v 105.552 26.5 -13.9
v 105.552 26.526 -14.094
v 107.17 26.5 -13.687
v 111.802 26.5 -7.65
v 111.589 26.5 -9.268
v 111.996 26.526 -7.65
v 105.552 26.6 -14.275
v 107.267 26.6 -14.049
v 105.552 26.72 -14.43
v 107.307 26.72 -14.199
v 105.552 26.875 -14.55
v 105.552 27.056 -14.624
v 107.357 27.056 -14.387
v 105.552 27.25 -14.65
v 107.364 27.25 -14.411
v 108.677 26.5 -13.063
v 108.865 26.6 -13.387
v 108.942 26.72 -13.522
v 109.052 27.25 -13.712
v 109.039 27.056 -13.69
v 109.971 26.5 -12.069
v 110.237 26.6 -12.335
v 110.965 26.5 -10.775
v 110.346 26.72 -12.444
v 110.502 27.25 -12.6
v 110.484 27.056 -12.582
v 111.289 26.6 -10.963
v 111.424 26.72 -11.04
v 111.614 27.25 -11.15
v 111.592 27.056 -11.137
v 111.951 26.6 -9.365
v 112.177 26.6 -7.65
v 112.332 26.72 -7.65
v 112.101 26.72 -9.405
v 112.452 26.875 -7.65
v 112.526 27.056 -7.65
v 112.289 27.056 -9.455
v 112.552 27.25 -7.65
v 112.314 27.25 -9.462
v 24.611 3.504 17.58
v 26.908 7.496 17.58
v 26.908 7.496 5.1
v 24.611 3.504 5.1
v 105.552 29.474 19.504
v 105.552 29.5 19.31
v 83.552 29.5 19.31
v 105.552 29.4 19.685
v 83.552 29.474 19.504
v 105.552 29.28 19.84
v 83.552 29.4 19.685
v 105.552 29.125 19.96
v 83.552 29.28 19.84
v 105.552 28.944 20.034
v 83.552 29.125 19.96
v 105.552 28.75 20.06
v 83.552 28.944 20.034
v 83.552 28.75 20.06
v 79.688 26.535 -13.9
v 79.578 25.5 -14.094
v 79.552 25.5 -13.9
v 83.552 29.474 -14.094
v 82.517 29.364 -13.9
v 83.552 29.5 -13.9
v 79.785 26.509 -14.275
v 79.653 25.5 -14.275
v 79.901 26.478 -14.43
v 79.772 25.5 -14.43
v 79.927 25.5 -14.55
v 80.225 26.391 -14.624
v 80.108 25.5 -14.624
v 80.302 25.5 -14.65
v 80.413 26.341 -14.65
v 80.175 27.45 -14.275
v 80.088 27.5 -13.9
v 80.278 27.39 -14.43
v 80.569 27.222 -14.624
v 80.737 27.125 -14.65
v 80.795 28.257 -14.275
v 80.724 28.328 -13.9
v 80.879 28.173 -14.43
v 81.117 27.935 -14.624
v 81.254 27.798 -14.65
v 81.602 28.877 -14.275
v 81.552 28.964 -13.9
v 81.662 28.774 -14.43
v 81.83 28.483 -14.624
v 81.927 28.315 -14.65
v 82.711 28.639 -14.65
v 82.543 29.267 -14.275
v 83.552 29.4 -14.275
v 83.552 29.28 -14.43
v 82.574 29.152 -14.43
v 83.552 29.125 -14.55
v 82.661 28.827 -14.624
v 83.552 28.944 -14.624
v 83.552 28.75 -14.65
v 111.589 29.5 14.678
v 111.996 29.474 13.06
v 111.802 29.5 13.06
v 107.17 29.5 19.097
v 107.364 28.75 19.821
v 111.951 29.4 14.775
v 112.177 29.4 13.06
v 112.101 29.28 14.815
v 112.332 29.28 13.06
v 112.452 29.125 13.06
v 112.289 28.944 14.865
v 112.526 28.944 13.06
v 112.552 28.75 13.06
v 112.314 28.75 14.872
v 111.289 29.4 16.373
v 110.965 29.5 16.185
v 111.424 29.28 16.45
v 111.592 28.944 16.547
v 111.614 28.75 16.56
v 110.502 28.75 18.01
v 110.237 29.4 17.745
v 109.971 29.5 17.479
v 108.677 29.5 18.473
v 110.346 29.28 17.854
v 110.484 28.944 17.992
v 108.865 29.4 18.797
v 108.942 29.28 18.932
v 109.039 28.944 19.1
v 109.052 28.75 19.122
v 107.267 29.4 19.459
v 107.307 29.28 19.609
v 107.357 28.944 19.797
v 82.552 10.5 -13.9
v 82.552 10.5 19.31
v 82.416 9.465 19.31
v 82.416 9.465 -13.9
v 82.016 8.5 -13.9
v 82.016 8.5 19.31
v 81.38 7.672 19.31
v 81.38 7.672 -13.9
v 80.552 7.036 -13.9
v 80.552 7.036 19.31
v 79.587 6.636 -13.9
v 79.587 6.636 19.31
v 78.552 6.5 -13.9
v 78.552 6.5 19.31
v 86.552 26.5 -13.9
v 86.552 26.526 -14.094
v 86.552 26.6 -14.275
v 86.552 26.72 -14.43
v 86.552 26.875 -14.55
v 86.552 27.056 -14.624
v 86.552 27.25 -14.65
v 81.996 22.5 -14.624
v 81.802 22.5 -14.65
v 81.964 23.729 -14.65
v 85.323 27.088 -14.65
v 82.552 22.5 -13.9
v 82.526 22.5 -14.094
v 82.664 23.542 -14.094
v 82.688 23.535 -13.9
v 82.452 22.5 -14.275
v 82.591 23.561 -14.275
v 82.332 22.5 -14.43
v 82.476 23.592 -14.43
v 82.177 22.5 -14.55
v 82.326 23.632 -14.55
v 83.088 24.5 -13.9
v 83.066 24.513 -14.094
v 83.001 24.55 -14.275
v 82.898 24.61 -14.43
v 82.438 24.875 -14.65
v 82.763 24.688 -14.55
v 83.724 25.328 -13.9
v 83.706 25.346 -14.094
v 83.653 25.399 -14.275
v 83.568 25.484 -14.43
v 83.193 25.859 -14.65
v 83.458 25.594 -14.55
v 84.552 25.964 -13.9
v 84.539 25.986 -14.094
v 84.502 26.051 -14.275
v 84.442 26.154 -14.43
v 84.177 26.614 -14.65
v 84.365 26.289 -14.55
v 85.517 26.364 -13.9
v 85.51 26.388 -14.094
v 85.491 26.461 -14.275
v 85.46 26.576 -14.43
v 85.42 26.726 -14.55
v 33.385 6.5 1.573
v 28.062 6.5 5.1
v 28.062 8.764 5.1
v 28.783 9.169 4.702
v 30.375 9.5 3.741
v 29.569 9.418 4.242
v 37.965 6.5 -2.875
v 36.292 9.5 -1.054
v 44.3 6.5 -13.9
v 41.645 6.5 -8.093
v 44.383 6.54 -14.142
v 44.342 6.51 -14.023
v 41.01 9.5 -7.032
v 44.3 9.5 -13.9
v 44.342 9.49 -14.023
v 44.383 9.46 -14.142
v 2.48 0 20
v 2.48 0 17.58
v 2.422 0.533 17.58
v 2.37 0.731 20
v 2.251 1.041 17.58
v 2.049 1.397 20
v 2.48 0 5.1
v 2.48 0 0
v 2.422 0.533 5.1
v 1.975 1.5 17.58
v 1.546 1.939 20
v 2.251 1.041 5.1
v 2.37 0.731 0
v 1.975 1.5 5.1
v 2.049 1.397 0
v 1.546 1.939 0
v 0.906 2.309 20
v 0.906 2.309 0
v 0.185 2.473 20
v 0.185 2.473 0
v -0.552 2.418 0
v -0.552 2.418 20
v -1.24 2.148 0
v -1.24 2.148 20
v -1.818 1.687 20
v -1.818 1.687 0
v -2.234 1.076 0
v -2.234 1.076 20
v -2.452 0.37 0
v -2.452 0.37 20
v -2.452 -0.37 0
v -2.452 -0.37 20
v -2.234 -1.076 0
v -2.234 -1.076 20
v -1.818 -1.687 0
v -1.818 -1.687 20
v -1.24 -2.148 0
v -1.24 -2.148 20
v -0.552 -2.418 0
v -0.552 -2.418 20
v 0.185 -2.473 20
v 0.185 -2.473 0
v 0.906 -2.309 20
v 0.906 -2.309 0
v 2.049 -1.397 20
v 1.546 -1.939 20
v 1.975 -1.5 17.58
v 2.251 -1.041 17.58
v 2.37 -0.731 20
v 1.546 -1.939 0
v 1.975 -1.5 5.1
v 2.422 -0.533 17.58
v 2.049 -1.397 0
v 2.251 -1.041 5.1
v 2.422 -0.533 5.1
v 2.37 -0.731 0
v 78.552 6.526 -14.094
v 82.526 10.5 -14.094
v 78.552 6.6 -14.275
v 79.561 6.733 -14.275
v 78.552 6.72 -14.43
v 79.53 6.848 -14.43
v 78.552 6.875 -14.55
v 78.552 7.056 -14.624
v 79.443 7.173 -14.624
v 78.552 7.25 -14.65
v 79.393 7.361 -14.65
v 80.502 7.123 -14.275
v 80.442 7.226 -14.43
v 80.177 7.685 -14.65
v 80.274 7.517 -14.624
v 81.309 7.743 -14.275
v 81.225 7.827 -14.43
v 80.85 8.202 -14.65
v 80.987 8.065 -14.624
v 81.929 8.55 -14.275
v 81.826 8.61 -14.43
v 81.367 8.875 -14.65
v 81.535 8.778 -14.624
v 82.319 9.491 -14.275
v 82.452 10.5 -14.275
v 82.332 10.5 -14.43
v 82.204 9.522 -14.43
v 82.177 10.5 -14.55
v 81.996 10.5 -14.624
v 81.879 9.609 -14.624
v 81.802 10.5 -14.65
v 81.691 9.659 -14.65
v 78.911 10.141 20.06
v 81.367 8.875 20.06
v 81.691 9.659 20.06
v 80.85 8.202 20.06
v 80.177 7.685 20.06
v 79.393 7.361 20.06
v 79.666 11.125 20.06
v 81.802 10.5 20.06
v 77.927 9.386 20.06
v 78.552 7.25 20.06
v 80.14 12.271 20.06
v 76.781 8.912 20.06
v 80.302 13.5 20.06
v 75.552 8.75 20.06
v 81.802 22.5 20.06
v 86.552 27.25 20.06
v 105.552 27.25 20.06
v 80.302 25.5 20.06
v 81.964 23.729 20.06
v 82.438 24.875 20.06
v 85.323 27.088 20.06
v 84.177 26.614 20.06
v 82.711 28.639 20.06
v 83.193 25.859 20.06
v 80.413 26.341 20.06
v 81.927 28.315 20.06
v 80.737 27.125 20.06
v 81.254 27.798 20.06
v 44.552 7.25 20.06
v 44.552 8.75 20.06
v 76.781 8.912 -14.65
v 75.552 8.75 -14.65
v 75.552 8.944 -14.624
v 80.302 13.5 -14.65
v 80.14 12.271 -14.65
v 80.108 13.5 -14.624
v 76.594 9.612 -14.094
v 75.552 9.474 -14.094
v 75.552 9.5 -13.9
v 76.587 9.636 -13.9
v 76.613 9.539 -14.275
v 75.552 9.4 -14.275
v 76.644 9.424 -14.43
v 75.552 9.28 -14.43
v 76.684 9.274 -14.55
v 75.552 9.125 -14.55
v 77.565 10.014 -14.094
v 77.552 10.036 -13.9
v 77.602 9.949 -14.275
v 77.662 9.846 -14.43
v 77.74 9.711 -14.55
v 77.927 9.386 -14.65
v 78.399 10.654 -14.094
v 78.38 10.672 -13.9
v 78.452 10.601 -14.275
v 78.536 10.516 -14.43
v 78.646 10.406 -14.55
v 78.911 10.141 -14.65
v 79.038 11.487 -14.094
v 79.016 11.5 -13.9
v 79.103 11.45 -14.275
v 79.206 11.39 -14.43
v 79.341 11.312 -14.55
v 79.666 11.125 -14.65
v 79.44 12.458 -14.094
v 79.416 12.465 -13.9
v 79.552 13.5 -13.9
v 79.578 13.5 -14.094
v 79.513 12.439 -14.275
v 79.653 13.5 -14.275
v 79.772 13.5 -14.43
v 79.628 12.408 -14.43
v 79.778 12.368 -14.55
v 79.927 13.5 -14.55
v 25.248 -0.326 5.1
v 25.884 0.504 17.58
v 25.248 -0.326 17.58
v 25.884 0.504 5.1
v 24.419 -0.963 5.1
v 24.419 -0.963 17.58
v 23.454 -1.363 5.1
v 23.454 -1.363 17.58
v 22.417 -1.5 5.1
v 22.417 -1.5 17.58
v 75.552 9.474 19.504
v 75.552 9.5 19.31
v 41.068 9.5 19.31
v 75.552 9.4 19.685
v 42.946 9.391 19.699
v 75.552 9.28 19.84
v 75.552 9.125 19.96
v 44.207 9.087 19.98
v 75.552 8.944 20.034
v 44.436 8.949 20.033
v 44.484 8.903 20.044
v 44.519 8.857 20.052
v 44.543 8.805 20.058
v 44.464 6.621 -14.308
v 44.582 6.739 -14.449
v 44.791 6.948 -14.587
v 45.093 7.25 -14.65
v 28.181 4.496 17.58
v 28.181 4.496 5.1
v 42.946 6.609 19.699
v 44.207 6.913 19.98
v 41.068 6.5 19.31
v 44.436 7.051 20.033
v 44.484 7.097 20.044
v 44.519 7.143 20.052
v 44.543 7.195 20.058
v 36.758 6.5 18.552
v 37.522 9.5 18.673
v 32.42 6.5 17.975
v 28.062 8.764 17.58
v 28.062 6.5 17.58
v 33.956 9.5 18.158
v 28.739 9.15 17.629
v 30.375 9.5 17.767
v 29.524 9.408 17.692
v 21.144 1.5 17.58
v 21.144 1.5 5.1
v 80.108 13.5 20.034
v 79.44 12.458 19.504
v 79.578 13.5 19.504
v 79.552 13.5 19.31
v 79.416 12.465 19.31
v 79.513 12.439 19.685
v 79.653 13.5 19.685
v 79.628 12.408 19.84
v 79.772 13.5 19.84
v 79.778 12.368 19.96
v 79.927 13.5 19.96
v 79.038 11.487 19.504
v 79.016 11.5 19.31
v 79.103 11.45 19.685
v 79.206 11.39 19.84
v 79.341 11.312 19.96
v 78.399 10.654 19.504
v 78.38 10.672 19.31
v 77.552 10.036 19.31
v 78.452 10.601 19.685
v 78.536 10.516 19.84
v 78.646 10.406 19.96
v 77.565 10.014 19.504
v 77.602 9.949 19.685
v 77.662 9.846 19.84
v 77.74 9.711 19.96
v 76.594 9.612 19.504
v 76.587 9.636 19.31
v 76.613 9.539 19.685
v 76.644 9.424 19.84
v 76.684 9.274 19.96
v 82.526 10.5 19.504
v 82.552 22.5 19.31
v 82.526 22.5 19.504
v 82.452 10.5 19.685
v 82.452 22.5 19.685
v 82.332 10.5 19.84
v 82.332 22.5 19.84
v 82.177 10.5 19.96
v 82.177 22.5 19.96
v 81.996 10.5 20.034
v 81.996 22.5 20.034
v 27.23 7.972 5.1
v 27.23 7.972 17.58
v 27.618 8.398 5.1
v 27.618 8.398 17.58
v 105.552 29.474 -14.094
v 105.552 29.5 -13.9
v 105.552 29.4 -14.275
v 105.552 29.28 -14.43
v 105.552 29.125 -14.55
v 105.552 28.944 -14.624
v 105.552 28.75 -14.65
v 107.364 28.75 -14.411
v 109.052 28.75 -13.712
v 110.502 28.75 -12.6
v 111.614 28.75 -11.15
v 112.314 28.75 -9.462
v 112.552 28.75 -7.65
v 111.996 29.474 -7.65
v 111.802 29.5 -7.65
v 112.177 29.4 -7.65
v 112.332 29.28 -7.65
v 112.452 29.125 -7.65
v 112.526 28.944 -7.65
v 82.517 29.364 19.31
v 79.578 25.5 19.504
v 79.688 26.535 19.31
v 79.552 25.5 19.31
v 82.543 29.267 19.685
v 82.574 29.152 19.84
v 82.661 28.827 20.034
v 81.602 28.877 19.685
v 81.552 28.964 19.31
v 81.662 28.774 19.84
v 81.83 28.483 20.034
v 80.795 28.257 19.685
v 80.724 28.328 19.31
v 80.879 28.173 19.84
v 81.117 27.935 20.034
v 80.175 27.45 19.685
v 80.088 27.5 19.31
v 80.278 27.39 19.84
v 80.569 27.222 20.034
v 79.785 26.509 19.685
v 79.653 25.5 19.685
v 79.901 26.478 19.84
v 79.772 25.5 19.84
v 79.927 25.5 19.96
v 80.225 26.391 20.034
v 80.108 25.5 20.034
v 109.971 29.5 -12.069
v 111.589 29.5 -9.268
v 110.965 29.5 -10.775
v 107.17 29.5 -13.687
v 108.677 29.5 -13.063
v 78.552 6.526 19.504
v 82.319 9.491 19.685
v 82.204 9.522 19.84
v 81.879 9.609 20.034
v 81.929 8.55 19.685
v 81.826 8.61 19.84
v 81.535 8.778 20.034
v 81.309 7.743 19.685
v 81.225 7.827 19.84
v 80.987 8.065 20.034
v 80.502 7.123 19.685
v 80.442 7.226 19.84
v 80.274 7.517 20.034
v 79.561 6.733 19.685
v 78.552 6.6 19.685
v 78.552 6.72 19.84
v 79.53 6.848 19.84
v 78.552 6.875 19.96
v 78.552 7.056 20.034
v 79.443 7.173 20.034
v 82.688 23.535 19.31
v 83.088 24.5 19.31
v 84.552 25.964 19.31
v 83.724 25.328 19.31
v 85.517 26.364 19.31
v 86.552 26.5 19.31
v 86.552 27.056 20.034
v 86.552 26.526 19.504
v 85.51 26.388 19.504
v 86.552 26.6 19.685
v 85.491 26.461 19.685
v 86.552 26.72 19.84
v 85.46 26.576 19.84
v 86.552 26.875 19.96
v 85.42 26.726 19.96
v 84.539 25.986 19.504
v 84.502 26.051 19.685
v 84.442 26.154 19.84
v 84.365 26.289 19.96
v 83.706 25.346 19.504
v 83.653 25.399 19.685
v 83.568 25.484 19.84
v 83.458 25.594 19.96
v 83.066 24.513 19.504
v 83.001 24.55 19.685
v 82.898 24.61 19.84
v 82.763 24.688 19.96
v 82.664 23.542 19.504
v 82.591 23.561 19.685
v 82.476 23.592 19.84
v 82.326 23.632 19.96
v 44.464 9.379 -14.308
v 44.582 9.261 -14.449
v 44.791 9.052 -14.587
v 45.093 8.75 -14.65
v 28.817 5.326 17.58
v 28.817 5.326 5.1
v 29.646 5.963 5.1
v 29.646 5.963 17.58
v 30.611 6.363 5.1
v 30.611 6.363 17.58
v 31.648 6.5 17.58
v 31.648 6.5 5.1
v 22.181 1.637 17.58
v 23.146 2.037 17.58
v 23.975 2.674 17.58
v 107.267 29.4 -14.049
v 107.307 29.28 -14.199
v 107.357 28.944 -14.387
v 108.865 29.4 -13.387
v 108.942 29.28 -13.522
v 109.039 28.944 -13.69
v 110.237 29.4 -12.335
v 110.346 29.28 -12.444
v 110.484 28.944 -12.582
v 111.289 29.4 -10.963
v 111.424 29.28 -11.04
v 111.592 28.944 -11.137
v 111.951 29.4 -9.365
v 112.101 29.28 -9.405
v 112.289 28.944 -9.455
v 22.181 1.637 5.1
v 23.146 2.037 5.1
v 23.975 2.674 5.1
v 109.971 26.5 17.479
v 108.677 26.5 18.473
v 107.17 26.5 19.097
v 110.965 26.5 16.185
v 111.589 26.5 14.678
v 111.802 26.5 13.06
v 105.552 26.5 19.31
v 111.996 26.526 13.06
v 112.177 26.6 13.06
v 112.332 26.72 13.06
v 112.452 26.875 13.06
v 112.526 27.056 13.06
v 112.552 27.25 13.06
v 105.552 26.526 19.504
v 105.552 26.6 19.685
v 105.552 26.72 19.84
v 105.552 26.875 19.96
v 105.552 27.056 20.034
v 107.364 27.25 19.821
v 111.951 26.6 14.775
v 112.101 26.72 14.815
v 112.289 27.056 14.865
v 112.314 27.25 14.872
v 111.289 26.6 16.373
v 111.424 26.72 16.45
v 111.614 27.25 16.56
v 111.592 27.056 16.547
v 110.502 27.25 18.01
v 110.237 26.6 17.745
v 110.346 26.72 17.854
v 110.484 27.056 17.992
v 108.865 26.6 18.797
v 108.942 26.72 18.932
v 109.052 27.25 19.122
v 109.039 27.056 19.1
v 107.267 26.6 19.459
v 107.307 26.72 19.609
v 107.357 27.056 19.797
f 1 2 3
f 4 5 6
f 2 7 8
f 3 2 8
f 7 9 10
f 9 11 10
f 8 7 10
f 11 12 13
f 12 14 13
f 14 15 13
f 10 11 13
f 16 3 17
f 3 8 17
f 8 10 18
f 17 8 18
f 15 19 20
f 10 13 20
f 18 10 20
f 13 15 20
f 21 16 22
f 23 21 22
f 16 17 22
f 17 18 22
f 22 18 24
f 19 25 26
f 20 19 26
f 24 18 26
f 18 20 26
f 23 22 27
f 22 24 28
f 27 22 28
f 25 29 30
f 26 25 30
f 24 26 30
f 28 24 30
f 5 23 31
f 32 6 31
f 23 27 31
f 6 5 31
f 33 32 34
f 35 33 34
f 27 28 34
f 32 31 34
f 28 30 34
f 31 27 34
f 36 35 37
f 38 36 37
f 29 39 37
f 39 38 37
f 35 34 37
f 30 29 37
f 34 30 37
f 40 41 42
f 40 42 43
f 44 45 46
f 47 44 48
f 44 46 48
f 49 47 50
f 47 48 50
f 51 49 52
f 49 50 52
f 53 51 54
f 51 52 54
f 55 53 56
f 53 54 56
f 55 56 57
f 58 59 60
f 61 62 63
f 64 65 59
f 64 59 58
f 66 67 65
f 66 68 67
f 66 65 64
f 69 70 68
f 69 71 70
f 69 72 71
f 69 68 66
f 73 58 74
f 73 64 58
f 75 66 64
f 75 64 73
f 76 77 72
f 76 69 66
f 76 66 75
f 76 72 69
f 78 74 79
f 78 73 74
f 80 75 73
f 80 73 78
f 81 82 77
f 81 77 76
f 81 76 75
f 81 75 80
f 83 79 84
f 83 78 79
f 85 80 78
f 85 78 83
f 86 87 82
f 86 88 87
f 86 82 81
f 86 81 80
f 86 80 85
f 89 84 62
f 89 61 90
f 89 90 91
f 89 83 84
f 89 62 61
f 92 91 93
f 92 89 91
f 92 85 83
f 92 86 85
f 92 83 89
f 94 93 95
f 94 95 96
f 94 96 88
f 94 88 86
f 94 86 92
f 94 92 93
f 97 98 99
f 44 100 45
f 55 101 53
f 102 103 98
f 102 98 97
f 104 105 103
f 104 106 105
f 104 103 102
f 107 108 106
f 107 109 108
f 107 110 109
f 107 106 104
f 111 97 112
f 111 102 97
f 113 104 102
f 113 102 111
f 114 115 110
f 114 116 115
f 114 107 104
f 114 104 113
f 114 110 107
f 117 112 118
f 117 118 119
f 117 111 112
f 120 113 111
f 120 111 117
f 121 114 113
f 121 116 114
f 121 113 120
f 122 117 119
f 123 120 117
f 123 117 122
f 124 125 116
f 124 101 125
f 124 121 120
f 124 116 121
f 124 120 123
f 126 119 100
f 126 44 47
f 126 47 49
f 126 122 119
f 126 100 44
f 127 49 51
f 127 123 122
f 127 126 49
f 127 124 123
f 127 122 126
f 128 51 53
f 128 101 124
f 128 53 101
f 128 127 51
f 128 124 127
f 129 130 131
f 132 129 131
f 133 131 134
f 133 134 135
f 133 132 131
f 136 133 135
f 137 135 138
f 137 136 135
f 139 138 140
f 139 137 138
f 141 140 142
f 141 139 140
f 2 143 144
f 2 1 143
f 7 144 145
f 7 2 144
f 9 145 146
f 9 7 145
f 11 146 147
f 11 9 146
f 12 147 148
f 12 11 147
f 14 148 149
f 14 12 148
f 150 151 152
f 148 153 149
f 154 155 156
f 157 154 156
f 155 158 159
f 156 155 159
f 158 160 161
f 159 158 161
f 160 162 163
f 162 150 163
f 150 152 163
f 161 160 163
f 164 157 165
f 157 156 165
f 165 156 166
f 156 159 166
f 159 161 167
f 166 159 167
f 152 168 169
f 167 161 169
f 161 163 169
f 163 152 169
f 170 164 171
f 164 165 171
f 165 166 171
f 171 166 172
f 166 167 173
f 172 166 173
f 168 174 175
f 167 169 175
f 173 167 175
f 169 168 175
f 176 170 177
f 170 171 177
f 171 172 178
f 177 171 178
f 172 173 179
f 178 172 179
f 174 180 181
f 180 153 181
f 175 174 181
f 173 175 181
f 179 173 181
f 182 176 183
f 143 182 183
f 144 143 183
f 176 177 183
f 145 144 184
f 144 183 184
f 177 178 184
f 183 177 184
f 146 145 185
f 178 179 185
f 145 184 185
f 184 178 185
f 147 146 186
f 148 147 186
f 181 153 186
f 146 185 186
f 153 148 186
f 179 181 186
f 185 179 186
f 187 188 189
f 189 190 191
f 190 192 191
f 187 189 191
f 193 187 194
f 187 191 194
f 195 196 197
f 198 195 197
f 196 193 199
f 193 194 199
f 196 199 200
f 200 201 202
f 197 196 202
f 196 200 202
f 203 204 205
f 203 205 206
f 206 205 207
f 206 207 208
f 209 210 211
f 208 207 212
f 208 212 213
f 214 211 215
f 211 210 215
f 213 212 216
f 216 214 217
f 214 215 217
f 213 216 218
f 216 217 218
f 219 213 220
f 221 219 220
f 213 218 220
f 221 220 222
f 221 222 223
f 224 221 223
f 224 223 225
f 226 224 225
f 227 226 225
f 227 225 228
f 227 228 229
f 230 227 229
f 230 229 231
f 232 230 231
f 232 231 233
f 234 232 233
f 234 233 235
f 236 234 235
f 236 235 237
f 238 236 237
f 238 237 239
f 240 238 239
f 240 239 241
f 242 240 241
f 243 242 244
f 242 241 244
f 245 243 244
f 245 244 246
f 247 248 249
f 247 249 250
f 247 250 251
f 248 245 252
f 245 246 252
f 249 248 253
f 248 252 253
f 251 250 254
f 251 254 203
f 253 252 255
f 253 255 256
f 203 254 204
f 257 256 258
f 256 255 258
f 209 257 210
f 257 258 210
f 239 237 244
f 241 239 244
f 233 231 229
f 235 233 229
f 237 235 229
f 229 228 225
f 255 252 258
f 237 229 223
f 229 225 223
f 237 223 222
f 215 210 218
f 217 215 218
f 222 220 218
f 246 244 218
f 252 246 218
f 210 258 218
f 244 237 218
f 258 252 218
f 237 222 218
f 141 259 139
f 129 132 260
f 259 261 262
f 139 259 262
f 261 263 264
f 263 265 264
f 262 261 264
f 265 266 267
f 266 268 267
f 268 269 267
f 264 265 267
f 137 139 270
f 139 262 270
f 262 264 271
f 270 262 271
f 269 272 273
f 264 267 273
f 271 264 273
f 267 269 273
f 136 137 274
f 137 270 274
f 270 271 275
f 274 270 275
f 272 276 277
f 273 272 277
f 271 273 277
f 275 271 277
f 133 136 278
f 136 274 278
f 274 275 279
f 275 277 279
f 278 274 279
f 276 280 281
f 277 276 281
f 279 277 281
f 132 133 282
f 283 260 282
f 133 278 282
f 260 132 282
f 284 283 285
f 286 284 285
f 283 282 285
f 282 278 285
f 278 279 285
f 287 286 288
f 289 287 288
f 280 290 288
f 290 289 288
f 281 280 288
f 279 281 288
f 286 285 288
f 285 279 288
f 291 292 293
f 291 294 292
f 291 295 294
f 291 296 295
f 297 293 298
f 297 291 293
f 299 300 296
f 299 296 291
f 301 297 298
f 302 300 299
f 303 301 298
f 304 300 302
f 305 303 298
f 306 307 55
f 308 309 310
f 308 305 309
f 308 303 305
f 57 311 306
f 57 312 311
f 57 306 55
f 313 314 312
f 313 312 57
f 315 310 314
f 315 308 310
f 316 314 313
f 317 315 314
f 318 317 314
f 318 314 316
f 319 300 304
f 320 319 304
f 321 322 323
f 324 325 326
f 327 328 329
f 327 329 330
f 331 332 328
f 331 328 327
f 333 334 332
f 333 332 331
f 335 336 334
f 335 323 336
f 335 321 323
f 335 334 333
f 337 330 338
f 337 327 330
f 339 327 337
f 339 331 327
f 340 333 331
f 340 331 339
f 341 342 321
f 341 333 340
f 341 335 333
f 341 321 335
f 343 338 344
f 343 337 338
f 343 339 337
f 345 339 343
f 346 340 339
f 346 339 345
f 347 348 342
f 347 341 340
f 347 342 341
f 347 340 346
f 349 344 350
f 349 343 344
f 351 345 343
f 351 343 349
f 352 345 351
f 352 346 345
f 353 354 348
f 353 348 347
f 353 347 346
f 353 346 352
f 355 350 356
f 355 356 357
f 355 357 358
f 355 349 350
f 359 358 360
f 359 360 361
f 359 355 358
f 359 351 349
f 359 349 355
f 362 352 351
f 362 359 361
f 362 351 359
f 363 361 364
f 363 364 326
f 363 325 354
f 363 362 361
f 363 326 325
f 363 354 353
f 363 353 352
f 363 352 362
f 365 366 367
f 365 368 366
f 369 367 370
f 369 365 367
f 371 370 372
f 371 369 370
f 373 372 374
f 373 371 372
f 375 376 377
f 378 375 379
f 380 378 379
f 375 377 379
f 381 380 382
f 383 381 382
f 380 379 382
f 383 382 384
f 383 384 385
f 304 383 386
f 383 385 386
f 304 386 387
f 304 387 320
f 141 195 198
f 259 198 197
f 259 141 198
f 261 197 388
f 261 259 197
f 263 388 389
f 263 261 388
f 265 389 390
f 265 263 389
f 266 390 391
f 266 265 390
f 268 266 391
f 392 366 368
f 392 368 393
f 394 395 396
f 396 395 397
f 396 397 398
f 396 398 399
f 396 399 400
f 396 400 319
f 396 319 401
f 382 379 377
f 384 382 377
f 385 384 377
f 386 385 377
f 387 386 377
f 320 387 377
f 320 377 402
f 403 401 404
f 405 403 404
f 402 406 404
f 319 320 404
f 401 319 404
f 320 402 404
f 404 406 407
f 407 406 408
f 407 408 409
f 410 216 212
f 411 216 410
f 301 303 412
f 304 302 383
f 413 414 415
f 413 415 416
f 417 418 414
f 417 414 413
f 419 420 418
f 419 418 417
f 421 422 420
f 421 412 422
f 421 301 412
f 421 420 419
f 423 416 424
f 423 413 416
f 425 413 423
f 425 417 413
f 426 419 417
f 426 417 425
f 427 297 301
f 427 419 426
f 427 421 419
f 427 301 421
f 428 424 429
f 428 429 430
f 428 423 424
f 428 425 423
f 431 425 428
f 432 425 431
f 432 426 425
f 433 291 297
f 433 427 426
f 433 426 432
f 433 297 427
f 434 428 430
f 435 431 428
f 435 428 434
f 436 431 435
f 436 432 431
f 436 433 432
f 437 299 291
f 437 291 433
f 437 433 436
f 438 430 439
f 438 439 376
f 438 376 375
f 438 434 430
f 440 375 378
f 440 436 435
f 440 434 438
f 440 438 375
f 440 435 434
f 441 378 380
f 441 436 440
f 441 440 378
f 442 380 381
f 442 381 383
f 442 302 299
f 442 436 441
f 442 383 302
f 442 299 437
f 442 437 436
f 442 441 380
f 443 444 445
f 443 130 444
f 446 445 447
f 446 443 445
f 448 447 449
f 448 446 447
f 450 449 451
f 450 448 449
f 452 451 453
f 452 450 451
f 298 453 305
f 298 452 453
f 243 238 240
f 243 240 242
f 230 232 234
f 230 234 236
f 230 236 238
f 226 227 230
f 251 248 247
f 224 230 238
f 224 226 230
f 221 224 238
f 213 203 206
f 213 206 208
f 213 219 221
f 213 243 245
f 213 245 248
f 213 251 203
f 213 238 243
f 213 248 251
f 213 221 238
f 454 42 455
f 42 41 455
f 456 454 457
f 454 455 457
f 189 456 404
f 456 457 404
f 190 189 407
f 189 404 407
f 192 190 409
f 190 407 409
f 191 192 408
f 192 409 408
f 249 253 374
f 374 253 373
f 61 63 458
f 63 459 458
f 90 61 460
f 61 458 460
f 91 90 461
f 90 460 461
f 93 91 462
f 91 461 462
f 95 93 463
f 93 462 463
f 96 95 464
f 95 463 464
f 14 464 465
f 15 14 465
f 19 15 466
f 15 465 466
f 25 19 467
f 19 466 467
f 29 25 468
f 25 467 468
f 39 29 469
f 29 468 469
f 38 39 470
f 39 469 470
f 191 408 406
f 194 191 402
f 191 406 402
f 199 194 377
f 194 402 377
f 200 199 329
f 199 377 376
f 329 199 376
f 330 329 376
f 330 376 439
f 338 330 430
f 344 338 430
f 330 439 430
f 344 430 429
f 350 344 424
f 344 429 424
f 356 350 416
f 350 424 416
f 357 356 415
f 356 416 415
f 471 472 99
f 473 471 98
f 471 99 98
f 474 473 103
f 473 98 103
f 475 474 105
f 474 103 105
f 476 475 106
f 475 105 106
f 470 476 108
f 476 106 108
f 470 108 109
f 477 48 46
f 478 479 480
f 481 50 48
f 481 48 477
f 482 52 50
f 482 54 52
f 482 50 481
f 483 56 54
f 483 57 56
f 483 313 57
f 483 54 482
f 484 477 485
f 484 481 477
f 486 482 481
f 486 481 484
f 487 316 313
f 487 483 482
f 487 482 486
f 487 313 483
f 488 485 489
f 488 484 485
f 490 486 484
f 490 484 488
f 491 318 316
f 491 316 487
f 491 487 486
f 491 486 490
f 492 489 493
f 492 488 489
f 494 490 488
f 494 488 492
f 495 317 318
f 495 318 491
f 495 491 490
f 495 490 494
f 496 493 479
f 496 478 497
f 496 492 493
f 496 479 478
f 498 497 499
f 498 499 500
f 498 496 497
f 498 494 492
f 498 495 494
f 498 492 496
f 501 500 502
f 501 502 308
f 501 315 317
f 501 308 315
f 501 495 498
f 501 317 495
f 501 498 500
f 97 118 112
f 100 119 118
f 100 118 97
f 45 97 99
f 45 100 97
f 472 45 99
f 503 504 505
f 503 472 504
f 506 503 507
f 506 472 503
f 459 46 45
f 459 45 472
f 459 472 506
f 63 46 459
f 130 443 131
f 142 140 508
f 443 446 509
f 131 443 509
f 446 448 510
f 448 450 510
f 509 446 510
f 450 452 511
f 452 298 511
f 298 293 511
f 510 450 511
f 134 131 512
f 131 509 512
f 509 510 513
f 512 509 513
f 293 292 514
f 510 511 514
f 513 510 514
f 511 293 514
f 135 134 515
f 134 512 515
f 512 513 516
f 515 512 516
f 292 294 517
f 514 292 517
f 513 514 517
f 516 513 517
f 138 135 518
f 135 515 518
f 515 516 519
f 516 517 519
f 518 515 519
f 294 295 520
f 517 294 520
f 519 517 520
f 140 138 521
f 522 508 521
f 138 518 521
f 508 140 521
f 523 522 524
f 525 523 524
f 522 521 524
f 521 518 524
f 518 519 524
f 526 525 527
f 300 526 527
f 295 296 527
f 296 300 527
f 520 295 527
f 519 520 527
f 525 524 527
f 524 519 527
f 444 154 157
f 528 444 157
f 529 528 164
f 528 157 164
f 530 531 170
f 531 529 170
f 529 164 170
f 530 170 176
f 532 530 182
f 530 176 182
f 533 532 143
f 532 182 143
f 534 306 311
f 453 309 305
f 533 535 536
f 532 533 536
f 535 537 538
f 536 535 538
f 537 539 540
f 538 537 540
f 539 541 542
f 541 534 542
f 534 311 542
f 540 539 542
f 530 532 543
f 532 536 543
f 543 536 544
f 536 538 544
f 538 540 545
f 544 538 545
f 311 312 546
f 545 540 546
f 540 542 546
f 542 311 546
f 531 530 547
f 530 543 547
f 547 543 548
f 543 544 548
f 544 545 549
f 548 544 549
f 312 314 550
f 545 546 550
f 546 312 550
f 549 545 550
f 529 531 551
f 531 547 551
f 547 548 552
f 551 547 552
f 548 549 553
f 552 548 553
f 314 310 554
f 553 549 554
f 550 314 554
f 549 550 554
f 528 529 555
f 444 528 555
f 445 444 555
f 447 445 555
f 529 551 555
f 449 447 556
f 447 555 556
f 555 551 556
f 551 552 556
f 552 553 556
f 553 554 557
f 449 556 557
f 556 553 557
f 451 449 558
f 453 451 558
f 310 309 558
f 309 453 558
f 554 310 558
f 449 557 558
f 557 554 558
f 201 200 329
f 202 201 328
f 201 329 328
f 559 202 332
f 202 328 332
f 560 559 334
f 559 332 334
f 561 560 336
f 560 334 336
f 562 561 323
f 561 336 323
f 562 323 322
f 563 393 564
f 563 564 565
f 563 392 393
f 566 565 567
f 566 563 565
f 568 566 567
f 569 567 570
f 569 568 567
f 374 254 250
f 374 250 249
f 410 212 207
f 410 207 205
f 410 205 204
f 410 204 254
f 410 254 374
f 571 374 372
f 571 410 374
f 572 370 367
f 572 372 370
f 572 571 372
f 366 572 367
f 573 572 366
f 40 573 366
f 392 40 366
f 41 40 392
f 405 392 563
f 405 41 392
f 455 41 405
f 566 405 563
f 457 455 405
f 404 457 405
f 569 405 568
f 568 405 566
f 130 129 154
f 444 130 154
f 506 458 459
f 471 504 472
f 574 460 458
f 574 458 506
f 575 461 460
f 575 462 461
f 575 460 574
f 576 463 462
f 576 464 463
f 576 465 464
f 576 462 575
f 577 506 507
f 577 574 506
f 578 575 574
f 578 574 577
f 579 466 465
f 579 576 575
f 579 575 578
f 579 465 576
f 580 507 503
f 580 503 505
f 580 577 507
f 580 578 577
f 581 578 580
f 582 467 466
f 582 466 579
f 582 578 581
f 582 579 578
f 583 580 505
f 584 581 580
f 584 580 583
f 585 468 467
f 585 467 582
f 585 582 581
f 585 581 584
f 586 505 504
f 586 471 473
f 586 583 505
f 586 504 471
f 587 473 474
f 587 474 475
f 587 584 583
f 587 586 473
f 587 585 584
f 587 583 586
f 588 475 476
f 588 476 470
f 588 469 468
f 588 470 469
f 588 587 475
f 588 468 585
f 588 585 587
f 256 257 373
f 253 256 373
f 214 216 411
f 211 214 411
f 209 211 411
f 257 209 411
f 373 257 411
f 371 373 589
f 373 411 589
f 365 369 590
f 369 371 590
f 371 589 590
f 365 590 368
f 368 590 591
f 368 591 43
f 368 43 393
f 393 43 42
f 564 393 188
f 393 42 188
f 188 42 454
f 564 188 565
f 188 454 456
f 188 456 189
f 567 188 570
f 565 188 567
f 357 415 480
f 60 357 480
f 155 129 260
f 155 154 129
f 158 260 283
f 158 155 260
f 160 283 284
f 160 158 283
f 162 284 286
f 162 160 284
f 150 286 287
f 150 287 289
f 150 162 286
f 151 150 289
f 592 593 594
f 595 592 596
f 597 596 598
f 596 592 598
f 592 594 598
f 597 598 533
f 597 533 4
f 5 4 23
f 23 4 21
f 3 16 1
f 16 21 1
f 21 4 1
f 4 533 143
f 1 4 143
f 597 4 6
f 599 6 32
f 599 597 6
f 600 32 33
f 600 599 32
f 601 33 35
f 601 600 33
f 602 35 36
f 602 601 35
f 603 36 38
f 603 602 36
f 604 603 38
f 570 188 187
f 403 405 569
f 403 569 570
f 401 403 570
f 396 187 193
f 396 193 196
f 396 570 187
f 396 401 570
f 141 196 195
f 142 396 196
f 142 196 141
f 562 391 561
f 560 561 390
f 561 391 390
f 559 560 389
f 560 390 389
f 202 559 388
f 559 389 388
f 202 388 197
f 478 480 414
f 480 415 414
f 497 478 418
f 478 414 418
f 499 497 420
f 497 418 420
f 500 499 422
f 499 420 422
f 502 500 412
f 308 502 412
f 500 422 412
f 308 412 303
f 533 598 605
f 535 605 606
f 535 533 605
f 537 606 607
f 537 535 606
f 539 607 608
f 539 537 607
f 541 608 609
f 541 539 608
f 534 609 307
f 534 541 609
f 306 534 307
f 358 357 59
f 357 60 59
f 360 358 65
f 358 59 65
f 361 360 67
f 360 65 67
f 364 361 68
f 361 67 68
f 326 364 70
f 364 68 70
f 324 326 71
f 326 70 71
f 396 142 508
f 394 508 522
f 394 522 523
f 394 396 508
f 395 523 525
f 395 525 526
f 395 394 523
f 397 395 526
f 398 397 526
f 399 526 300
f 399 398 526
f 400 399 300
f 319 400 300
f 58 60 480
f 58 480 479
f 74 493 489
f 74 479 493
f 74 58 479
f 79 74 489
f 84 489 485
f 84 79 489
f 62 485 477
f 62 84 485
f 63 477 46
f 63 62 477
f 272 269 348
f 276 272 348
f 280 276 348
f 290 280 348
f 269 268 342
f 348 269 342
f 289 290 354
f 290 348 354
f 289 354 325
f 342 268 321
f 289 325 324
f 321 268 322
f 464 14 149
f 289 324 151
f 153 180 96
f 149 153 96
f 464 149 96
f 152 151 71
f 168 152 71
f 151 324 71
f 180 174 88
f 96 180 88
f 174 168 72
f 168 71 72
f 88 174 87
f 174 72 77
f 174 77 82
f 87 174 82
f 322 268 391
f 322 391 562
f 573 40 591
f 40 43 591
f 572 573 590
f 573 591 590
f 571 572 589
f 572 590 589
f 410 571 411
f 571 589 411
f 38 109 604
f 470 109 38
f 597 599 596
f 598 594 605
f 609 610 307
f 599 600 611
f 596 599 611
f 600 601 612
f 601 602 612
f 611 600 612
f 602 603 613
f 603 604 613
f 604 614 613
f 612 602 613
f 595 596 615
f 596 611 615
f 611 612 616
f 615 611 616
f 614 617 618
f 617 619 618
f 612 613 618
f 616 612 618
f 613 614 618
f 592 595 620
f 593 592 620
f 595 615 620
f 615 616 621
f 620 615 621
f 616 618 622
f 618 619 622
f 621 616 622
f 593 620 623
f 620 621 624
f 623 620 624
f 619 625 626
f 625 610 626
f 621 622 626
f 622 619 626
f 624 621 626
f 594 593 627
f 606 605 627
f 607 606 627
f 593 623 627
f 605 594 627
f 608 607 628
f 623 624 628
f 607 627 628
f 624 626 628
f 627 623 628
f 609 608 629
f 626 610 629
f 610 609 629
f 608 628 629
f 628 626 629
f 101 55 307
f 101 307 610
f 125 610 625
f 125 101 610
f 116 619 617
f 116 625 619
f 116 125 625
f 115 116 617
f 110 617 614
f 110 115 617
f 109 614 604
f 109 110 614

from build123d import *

# Parameters (mm, degrees)
SKETCH2_R            = 2.48
BOSS_EXTRUDE1_DEPTH  = 20
SKETCH3_W            = 24.73
SKETCH3_H            = 12.48
BOSS_EXTRUDE3_DEPTH  = 1.5
BOSS_EXTRUDE7_DEPTH  = 12.48
BOSS_EXTRUDE9_DEPTH  = 3
SKETCH9_W            = 10
SKETCH9_H            = 3
BOSS_EXTRUDE10_DEPTH = 34.71
SKETCH10_W           = 3
SKETCH10_H           = 23
BOSS_EXTRUDE11_DEPTH = 34.71
SKETCH11_W           = 34.71
SKETCH11_H           = 3
BOSS_EXTRUDE12_DEPTH = 30
FILLET1_R            = 4
FILLET3_R            = 7
FILLET4_R            = 0.75


with BuildPart() as part:
    # Sketch2 → Boss-Extrude1 (new body)
    with BuildSketch(Plane.XY):
        Circle(SKETCH2_R)
    extrude(amount=BOSS_EXTRUDE1_DEPTH)

    # Sketch3 → Boss-Extrude3 (add, symmetric)
    with BuildSketch(Plane(origin=(0, 0, 0), x_dir=(1, 0, 0), z_dir=(0, 1, 0))):
        with Locations((12.365, -11.34)):
            Rectangle(SKETCH3_W, SKETCH3_H)
    extrude(amount=BOSS_EXTRUDE3_DEPTH, both=True)

    # Sketch7 → Boss-Extrude7 (add)
    with BuildSketch(Plane.XY.offset(5.1)):
        Polygon((21.73, -1.5), (24.73, -1.5), (31.062035578, 9.5), (28.062035578, 9.5), align=None)
    extrude(amount=BOSS_EXTRUDE7_DEPTH)

    # Sketch8 → Boss-Extrude9 (add)
    with BuildSketch(Plane(origin=(0, 9.5, 0), x_dir=(1, 0, 0), z_dir=(0, 1, 0))):
        with BuildLine():
            Line((72.552035578, -20.06), (44.552035578, -20.06))
            ThreePointArc((44.552035578, -20.06), (36.356523667, -18.490944118), (28.062035578, -17.58))
            Line((28.062035578, -17.58), (28.062035578, -5.1))
            ThreePointArc((28.062035578, -5.1), (38.220194009, 3.177633796), (44.552035578, 14.65))
            Line((44.552035578, 14.65), (72.552035578, 14.65))
            Line((72.552035578, 14.65), (72.552035578, -20.06))
        make_face()
    extrude(amount=-BOSS_EXTRUDE9_DEPTH)

    # Sketch9 → Boss-Extrude10 (add)
    with BuildSketch(Plane.XY.offset(20.06)):
        with Locations((77.552035578, 8)):
            Rectangle(SKETCH9_W, SKETCH9_H)
    extrude(amount=-BOSS_EXTRUDE10_DEPTH)

    # Sketch10 → Boss-Extrude11 (add)
    with BuildSketch(Plane.XY.offset(20.06)):
        with Locations((81.052035578, 18)):
            Rectangle(SKETCH10_W, SKETCH10_H)
    extrude(amount=-BOSS_EXTRUDE11_DEPTH)

    # Sketch11 → Boss-Extrude12 (add)
    with BuildSketch(Plane(origin=(82.552035578, 0, 0), x_dir=(0, 0, -1), z_dir=(1, 0, 0))):
        with Locations((-2.705, 28)):
            Rectangle(SKETCH11_W, SKETCH11_H)
    extrude(amount=BOSS_EXTRUDE12_DEPTH)

    # Fillet1
    fillet1_edges = [part.edges().sort_by_distance(p)[0] for p in [
        (24.73, -1.5, 11.34),
        (82.552035578, 26.5, 2.705),
        (23.456918794, 1.5, 11.34),
        (28.062035578, 9.5, 11.34),
        (29.335116784, 6.5, 11.34),
        (82.552035578, 6.5, 2.705),
        (79.552035578, 9.5, 2.705),
        (79.552035578, 29.5, 2.705),
    ]]
    fillet(fillet1_edges, radius=FILLET1_R)

    # Fillet3
    fillet3_edges = [part.edges().sort_by_distance(p)[0] for p in [
        (112.552035578, 28, 20.06),
        (112.552035578, 28, -14.65),
    ]]
    fillet(fillet3_edges, radius=FILLET3_R)

    # Fillet4
    fillet4_edges = [part.edges().sort_by_distance(p)[0] for p in [
        (60.052035578, 9.5, -14.65),
        (61.552035578, 6.5, -14.65),
        (82.552035578, 16.5, 20.06),
        (79.552035578, 19.5, 20.06),
        (80.723608453, 28.328427125, 20.06),
        (81.380462702, 7.671572875, 20.06),
        (82.552035578, 16.5, -14.65),
        (79.552035578, 19.5, -14.65),
        (80.723608453, 28.328427125, -14.65),
        (81.380462702, 7.671572875, -14.65),
        (78.380462702, 10.671572875, -14.65),
        (78.380462702, 10.671572875, 20.06),
        (83.723608453, 25.328427125, -14.65),
        (83.723608453, 25.328427125, 20.06),
        (112.552035578, 26.5, 2.705),
        (112.552035578, 29.5, 2.705),
        (96.052035578, 26.5, 20.06),
        (96.052035578, 26.5, -14.65),
        (110.501783046, 26.5, -12.599747468),
        (110.501783046, 26.5, 18.009747468),
        (94.552035578, 29.5, 20.06),
        (94.552035578, 29.5, -14.65),
        (110.501783046, 29.5, -12.599747468),
        (110.501783046, 29.5, 18.009747468),
        (60.052035578, 9.5, 20.06),
        (44.552035578, 8, -14.65),
        (61.552035578, 6.5, 20.06),
    ]]
    fillet(fillet4_edges, radius=FILLET4_R)


with BuildPart() as body_2:
    # Mirror5: mirrored copy
    add(part.part.mirror(Plane(origin=(119.85106591, 0, 0), x_dir=(0, 0, 1), z_dir=(1, 0, 0))))


with BuildPart() as body_2_2:
    # Mirror6: mirrored copy
    add(body_2.part.mirror(Plane(origin=(119.85106591, 0, 0), x_dir=(0, 0, 1), z_dir=(1, 0, 0))))


solid = body_2_2.part
